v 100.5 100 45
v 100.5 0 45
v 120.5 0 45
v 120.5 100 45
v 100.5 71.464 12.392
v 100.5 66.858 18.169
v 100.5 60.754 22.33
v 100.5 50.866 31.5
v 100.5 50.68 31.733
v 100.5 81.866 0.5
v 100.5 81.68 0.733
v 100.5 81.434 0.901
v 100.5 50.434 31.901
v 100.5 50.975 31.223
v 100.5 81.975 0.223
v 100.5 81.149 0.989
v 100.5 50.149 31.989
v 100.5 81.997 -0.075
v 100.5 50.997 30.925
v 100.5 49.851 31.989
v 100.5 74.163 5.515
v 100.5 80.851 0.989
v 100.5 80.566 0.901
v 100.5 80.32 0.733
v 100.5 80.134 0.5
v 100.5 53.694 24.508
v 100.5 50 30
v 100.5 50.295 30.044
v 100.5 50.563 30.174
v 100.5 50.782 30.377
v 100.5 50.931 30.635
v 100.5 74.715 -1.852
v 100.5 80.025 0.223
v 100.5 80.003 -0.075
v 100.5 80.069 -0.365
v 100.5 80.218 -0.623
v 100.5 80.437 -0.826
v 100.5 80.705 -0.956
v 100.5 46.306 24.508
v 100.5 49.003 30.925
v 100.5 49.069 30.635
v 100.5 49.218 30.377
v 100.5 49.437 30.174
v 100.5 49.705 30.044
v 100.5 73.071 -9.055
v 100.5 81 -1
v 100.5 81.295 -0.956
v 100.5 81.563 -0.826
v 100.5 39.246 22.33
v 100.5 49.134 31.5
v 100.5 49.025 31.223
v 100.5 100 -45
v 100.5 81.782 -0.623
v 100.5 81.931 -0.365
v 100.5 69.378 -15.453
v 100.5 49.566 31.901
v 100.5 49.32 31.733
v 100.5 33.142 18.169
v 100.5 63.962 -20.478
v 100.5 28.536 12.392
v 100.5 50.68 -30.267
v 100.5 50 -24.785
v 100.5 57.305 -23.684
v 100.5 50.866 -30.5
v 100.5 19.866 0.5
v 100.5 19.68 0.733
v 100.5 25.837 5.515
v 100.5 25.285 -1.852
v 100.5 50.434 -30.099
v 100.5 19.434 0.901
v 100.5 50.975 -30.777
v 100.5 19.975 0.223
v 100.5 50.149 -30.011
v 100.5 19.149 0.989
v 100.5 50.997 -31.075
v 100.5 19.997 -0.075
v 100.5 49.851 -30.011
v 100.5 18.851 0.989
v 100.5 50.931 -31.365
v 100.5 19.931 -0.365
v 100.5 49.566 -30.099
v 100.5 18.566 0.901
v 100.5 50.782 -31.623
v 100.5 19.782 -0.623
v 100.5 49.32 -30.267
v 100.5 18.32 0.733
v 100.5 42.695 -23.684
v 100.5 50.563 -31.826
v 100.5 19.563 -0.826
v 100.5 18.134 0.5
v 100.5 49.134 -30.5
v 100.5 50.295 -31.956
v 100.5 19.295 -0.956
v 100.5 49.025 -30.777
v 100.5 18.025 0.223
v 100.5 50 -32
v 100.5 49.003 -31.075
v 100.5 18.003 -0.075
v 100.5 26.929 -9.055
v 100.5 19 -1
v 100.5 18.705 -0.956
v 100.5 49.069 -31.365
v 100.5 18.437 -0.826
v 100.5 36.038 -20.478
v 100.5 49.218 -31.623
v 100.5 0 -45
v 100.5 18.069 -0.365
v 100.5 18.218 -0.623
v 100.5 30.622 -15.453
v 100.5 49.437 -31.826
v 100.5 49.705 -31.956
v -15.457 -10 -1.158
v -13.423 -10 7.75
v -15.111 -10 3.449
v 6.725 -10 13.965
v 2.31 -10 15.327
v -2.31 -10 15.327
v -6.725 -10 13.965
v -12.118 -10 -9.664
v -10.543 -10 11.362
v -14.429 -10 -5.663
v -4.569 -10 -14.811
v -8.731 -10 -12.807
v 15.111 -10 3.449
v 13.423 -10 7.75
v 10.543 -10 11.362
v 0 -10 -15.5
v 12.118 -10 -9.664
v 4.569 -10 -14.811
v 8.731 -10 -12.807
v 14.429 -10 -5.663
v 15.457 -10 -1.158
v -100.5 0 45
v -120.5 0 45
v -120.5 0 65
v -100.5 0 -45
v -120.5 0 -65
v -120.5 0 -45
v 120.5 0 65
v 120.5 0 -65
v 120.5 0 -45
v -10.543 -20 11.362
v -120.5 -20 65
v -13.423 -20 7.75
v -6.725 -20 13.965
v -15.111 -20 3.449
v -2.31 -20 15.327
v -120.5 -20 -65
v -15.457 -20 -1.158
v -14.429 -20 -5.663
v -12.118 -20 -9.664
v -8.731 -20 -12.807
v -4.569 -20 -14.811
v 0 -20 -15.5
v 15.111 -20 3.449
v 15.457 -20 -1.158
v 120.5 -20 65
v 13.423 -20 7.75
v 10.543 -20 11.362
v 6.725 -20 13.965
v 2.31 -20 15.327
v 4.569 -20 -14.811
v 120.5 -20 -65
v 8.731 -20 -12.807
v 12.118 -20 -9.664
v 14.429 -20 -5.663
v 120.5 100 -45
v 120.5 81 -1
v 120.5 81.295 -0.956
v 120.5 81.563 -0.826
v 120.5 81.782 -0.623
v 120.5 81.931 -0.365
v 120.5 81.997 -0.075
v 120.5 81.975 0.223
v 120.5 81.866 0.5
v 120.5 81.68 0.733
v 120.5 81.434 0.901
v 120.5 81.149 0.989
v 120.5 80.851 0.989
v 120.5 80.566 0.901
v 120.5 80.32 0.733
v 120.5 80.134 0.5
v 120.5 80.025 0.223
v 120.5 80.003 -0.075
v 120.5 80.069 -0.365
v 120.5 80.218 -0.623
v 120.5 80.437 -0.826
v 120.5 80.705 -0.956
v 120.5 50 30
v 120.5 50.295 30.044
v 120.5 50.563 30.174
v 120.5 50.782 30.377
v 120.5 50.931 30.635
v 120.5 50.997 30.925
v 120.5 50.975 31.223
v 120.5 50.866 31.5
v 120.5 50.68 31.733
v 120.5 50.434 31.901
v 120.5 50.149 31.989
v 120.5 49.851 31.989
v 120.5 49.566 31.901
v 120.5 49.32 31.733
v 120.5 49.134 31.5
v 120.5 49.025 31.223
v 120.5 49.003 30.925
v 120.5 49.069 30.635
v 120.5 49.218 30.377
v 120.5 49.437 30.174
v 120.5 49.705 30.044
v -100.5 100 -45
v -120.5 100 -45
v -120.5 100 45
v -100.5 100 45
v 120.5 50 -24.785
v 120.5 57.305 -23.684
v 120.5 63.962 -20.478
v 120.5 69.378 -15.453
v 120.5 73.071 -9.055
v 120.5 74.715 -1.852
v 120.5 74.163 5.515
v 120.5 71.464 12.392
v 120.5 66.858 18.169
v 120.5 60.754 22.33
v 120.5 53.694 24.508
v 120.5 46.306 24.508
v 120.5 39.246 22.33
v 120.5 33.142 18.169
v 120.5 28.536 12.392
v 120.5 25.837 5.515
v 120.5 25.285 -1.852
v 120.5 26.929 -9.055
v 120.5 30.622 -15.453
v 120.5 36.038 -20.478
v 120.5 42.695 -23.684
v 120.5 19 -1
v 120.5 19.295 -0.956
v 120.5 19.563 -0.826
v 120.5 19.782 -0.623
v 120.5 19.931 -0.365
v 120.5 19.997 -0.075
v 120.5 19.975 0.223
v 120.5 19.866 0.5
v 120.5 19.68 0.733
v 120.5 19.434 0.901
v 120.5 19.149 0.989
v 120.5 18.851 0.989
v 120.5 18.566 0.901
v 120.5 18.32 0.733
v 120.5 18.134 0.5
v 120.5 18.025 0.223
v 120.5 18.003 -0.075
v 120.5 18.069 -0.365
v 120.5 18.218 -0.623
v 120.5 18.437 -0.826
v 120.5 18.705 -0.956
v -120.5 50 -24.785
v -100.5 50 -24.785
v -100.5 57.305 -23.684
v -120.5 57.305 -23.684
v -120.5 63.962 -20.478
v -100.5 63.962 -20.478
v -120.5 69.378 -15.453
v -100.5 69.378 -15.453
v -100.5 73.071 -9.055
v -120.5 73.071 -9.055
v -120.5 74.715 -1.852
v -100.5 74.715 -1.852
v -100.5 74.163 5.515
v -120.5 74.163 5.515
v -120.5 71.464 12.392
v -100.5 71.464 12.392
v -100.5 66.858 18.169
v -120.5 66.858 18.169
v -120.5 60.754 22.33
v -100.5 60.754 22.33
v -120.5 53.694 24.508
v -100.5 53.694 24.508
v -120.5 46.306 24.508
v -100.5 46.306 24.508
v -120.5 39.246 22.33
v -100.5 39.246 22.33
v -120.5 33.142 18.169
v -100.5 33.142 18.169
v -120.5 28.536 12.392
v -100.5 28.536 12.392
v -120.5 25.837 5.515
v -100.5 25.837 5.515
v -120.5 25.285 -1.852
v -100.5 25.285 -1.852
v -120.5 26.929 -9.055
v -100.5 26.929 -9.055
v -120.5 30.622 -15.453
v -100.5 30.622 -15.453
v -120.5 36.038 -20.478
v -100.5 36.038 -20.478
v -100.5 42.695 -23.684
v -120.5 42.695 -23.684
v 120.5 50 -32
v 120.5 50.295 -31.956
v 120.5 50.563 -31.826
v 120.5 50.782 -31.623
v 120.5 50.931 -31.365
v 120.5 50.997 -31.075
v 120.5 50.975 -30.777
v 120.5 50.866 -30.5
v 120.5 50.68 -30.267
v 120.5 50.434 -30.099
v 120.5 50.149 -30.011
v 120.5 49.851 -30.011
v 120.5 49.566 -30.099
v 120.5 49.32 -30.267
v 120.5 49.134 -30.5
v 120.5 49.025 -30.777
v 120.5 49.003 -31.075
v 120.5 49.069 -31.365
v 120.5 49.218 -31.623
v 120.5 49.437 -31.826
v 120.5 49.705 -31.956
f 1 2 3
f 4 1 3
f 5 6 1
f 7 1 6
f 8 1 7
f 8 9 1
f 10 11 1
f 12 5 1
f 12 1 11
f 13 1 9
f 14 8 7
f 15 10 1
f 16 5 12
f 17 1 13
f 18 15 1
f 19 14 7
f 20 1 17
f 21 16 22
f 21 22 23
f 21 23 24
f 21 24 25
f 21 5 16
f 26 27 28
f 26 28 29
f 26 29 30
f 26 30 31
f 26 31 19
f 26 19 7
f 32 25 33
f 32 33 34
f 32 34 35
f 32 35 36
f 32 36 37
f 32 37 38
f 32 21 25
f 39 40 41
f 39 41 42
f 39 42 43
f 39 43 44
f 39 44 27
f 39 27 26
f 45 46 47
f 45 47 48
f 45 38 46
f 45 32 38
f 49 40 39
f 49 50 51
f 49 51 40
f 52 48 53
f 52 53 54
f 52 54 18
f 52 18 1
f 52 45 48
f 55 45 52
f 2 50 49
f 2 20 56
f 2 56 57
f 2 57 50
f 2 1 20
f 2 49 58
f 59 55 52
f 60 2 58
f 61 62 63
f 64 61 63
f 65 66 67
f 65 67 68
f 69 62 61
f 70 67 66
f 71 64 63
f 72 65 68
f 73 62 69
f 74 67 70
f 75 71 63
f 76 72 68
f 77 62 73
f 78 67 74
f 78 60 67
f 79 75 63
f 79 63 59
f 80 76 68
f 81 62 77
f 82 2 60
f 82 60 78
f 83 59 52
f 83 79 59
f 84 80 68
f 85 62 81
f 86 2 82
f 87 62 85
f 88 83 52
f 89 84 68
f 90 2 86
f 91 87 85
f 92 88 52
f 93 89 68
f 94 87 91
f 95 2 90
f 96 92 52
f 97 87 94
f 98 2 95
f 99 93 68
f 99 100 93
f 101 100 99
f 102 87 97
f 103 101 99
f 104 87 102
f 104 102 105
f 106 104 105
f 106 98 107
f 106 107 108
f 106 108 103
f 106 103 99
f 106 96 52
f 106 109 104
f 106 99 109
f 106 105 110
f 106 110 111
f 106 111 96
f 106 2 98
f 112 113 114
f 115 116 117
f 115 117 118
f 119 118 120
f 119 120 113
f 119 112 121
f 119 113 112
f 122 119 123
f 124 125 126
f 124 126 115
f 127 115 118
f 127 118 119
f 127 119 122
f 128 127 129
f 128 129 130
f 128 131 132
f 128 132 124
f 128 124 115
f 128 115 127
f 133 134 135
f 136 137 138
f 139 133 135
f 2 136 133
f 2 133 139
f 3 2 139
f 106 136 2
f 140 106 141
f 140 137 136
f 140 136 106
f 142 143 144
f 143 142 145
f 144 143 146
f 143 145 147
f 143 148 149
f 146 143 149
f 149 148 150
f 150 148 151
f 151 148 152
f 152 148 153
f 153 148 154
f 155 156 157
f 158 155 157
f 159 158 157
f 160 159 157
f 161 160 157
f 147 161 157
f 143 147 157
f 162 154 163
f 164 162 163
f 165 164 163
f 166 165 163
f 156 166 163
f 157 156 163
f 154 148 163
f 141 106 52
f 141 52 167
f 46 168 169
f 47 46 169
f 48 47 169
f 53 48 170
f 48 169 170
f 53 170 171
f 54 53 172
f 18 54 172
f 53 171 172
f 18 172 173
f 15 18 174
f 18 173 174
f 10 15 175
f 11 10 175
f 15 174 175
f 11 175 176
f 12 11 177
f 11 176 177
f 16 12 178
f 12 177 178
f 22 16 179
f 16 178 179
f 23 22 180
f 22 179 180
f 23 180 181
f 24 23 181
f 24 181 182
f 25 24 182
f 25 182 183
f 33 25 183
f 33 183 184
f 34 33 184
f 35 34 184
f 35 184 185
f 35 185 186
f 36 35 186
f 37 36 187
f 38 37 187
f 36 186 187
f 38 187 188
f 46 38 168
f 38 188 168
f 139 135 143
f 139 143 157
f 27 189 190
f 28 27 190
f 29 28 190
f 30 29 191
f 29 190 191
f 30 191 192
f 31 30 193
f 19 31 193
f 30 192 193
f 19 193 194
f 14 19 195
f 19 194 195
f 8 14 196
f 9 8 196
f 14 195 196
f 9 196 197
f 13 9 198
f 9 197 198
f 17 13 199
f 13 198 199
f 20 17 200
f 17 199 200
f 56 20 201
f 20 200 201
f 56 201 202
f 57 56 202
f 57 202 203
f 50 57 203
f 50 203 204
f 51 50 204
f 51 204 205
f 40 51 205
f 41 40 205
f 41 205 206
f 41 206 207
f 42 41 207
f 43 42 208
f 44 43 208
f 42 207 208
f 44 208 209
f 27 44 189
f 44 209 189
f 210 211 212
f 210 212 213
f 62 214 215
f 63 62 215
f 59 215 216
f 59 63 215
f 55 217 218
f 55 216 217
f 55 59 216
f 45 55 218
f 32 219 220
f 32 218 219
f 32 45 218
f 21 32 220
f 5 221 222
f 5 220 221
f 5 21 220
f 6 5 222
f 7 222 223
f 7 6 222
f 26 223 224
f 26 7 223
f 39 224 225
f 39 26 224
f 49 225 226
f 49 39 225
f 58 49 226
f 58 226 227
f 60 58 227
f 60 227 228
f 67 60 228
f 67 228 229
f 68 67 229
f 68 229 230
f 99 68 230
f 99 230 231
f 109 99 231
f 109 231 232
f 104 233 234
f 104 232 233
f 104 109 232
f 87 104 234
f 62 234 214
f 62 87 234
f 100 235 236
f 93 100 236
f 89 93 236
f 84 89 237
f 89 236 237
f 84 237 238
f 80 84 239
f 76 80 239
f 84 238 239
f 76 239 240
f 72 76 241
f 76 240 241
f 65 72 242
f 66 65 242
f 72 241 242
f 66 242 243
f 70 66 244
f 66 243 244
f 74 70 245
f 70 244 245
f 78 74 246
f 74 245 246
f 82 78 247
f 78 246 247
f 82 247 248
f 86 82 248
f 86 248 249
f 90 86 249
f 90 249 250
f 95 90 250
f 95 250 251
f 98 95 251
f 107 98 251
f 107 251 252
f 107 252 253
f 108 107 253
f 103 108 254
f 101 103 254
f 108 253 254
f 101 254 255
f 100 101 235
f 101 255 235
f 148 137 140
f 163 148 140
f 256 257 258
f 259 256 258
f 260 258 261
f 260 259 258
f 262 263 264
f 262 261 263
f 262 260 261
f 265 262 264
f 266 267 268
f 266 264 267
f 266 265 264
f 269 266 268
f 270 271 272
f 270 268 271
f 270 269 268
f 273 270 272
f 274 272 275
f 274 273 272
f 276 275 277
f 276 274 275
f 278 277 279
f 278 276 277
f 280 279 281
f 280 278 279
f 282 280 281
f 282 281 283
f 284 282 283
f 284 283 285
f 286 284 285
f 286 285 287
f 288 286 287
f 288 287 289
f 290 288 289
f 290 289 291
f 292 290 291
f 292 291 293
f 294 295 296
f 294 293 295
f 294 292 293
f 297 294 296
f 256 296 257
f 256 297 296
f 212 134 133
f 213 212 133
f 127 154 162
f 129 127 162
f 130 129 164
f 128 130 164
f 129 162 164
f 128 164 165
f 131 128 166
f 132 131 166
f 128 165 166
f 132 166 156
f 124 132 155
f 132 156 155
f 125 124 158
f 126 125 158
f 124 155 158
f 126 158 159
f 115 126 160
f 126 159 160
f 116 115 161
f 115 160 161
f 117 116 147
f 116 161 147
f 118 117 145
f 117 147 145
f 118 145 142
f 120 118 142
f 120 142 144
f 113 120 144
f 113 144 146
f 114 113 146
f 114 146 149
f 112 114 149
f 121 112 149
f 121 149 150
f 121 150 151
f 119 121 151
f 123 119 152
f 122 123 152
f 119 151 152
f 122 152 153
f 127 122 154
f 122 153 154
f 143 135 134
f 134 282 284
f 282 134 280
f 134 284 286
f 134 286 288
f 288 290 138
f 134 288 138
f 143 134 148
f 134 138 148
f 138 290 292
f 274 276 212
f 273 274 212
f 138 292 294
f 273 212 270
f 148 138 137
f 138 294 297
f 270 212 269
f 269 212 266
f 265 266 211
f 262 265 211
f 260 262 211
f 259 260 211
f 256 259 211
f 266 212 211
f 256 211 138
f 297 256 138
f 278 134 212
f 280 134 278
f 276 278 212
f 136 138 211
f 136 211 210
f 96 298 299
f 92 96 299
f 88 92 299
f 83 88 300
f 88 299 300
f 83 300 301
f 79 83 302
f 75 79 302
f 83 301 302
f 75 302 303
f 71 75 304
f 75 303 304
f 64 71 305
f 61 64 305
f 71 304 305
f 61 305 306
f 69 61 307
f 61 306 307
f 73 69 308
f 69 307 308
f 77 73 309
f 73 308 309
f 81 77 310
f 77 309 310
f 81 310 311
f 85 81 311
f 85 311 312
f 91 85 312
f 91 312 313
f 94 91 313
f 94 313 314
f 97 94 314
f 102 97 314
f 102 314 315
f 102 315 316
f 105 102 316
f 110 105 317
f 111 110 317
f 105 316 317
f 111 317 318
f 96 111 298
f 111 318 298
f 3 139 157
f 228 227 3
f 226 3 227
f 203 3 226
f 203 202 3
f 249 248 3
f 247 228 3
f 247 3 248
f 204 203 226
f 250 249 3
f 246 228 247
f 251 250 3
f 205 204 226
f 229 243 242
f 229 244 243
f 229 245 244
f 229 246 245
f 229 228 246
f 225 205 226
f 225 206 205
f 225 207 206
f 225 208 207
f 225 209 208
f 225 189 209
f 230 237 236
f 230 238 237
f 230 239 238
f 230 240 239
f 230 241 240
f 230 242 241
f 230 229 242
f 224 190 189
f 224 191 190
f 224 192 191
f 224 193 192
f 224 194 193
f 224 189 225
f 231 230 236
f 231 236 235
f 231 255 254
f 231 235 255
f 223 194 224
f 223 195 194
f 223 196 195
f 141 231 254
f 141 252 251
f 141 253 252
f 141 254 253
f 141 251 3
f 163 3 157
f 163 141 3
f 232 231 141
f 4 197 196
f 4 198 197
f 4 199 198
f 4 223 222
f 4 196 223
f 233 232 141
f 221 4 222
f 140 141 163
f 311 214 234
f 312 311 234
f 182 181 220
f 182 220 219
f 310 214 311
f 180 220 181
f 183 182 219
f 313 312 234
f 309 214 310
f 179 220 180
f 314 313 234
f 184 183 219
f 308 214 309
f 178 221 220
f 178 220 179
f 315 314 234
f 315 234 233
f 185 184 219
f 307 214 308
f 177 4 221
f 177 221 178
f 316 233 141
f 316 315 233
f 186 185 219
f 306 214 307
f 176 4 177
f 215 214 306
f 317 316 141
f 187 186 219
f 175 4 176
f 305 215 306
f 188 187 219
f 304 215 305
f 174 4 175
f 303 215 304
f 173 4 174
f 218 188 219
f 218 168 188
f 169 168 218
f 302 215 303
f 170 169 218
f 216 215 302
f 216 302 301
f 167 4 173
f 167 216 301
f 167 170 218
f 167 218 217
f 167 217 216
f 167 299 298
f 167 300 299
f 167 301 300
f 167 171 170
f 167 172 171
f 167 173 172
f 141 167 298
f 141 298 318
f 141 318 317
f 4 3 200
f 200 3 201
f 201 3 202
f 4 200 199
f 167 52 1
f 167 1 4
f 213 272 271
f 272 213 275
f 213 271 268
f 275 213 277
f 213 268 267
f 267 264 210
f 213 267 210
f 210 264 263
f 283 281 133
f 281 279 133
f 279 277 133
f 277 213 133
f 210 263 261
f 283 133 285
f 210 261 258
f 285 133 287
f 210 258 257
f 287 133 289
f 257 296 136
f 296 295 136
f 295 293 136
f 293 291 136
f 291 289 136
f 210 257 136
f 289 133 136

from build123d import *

# Parameters (mm, degrees)
SKETCH5_W               = 241
SKETCH5_H               = 130
BOSS_EXTRUDE2_DEPTH     = 20
SKETCH6_W               = 20
SKETCH6_H               = 90
BOSS_EXTRUDE3_DEPTH     = 100
CUT_EXTRUDE1_DEPTH      = 269.897750084
CUT_EXTRUDE1_DEPTH_BACK = 269.897750084
SKETCH8_R               = 24.784776311
SKETCH9_R               = 15.5
CUT_EXTRUDE2_DEPTH      = 10
SKETCH10_R              = 1
CUT_EXTRUDE3_DEPTH      = 20


with BuildPart() as part:
    # Sketch5 → Boss-Extrude2 (new body)
    with BuildSketch(Plane(origin=(0, 0, 0), x_dir=(1, 0, 0), z_dir=(0, 1, 0))):
        Rectangle(SKETCH5_W, SKETCH5_H)
    extrude(amount=-BOSS_EXTRUDE2_DEPTH)

    # Sketch6 → Boss-Extrude3 (add)
    with BuildSketch(Plane(origin=(0, 0, 0), x_dir=(1, 0, 0), z_dir=(0, 1, 0))):
        with Locations((110.5, 0)):
            Rectangle(SKETCH6_W, SKETCH6_H)
        with Locations((-110.5, 0)):
            Rectangle(SKETCH6_W, SKETCH6_H)
    extrude(amount=BOSS_EXTRUDE3_DEPTH)

    # Sketch8 → Cut-Extrude1 (cut, two sides: drawn at the far end of the back side and taken through both)
    with BuildSketch(Plane(origin=(120.5, 0, 0), x_dir=(0, 0, -1), z_dir=(1, 0, 0)).offset(-CUT_EXTRUDE1_DEPTH_BACK)):
        with Locations((0, 50)):
            Circle(SKETCH8_R)
    extrude(amount=CUT_EXTRUDE1_DEPTH + CUT_EXTRUDE1_DEPTH_BACK, mode=Mode.SUBTRACT)

    # Sketch9 → Cut-Extrude2 (cut)
    with BuildSketch(Plane.XZ.offset(20)):
        with Locations(Location((0, 0, 0), (0, 0, 270))):
            Circle(SKETCH9_R)
    extrude(amount=-CUT_EXTRUDE2_DEPTH, mode=Mode.SUBTRACT)

    # Sketch10 → Cut-Extrude3 (cut)
    with BuildSketch(Plane(origin=(120.5, 0, 0), x_dir=(0, 0, -1), z_dir=(1, 0, 0))):
        with Locations((0, 81)):
            Circle(SKETCH10_R)
        with Locations((-31, 50)):
            Circle(SKETCH10_R)
        with Locations((31, 50)):
            Circle(SKETCH10_R)
        with Locations((0, 19)):
            Circle(SKETCH10_R)
    extrude(amount=-CUT_EXTRUDE3_DEPTH, mode=Mode.SUBTRACT)


solid = part.part
